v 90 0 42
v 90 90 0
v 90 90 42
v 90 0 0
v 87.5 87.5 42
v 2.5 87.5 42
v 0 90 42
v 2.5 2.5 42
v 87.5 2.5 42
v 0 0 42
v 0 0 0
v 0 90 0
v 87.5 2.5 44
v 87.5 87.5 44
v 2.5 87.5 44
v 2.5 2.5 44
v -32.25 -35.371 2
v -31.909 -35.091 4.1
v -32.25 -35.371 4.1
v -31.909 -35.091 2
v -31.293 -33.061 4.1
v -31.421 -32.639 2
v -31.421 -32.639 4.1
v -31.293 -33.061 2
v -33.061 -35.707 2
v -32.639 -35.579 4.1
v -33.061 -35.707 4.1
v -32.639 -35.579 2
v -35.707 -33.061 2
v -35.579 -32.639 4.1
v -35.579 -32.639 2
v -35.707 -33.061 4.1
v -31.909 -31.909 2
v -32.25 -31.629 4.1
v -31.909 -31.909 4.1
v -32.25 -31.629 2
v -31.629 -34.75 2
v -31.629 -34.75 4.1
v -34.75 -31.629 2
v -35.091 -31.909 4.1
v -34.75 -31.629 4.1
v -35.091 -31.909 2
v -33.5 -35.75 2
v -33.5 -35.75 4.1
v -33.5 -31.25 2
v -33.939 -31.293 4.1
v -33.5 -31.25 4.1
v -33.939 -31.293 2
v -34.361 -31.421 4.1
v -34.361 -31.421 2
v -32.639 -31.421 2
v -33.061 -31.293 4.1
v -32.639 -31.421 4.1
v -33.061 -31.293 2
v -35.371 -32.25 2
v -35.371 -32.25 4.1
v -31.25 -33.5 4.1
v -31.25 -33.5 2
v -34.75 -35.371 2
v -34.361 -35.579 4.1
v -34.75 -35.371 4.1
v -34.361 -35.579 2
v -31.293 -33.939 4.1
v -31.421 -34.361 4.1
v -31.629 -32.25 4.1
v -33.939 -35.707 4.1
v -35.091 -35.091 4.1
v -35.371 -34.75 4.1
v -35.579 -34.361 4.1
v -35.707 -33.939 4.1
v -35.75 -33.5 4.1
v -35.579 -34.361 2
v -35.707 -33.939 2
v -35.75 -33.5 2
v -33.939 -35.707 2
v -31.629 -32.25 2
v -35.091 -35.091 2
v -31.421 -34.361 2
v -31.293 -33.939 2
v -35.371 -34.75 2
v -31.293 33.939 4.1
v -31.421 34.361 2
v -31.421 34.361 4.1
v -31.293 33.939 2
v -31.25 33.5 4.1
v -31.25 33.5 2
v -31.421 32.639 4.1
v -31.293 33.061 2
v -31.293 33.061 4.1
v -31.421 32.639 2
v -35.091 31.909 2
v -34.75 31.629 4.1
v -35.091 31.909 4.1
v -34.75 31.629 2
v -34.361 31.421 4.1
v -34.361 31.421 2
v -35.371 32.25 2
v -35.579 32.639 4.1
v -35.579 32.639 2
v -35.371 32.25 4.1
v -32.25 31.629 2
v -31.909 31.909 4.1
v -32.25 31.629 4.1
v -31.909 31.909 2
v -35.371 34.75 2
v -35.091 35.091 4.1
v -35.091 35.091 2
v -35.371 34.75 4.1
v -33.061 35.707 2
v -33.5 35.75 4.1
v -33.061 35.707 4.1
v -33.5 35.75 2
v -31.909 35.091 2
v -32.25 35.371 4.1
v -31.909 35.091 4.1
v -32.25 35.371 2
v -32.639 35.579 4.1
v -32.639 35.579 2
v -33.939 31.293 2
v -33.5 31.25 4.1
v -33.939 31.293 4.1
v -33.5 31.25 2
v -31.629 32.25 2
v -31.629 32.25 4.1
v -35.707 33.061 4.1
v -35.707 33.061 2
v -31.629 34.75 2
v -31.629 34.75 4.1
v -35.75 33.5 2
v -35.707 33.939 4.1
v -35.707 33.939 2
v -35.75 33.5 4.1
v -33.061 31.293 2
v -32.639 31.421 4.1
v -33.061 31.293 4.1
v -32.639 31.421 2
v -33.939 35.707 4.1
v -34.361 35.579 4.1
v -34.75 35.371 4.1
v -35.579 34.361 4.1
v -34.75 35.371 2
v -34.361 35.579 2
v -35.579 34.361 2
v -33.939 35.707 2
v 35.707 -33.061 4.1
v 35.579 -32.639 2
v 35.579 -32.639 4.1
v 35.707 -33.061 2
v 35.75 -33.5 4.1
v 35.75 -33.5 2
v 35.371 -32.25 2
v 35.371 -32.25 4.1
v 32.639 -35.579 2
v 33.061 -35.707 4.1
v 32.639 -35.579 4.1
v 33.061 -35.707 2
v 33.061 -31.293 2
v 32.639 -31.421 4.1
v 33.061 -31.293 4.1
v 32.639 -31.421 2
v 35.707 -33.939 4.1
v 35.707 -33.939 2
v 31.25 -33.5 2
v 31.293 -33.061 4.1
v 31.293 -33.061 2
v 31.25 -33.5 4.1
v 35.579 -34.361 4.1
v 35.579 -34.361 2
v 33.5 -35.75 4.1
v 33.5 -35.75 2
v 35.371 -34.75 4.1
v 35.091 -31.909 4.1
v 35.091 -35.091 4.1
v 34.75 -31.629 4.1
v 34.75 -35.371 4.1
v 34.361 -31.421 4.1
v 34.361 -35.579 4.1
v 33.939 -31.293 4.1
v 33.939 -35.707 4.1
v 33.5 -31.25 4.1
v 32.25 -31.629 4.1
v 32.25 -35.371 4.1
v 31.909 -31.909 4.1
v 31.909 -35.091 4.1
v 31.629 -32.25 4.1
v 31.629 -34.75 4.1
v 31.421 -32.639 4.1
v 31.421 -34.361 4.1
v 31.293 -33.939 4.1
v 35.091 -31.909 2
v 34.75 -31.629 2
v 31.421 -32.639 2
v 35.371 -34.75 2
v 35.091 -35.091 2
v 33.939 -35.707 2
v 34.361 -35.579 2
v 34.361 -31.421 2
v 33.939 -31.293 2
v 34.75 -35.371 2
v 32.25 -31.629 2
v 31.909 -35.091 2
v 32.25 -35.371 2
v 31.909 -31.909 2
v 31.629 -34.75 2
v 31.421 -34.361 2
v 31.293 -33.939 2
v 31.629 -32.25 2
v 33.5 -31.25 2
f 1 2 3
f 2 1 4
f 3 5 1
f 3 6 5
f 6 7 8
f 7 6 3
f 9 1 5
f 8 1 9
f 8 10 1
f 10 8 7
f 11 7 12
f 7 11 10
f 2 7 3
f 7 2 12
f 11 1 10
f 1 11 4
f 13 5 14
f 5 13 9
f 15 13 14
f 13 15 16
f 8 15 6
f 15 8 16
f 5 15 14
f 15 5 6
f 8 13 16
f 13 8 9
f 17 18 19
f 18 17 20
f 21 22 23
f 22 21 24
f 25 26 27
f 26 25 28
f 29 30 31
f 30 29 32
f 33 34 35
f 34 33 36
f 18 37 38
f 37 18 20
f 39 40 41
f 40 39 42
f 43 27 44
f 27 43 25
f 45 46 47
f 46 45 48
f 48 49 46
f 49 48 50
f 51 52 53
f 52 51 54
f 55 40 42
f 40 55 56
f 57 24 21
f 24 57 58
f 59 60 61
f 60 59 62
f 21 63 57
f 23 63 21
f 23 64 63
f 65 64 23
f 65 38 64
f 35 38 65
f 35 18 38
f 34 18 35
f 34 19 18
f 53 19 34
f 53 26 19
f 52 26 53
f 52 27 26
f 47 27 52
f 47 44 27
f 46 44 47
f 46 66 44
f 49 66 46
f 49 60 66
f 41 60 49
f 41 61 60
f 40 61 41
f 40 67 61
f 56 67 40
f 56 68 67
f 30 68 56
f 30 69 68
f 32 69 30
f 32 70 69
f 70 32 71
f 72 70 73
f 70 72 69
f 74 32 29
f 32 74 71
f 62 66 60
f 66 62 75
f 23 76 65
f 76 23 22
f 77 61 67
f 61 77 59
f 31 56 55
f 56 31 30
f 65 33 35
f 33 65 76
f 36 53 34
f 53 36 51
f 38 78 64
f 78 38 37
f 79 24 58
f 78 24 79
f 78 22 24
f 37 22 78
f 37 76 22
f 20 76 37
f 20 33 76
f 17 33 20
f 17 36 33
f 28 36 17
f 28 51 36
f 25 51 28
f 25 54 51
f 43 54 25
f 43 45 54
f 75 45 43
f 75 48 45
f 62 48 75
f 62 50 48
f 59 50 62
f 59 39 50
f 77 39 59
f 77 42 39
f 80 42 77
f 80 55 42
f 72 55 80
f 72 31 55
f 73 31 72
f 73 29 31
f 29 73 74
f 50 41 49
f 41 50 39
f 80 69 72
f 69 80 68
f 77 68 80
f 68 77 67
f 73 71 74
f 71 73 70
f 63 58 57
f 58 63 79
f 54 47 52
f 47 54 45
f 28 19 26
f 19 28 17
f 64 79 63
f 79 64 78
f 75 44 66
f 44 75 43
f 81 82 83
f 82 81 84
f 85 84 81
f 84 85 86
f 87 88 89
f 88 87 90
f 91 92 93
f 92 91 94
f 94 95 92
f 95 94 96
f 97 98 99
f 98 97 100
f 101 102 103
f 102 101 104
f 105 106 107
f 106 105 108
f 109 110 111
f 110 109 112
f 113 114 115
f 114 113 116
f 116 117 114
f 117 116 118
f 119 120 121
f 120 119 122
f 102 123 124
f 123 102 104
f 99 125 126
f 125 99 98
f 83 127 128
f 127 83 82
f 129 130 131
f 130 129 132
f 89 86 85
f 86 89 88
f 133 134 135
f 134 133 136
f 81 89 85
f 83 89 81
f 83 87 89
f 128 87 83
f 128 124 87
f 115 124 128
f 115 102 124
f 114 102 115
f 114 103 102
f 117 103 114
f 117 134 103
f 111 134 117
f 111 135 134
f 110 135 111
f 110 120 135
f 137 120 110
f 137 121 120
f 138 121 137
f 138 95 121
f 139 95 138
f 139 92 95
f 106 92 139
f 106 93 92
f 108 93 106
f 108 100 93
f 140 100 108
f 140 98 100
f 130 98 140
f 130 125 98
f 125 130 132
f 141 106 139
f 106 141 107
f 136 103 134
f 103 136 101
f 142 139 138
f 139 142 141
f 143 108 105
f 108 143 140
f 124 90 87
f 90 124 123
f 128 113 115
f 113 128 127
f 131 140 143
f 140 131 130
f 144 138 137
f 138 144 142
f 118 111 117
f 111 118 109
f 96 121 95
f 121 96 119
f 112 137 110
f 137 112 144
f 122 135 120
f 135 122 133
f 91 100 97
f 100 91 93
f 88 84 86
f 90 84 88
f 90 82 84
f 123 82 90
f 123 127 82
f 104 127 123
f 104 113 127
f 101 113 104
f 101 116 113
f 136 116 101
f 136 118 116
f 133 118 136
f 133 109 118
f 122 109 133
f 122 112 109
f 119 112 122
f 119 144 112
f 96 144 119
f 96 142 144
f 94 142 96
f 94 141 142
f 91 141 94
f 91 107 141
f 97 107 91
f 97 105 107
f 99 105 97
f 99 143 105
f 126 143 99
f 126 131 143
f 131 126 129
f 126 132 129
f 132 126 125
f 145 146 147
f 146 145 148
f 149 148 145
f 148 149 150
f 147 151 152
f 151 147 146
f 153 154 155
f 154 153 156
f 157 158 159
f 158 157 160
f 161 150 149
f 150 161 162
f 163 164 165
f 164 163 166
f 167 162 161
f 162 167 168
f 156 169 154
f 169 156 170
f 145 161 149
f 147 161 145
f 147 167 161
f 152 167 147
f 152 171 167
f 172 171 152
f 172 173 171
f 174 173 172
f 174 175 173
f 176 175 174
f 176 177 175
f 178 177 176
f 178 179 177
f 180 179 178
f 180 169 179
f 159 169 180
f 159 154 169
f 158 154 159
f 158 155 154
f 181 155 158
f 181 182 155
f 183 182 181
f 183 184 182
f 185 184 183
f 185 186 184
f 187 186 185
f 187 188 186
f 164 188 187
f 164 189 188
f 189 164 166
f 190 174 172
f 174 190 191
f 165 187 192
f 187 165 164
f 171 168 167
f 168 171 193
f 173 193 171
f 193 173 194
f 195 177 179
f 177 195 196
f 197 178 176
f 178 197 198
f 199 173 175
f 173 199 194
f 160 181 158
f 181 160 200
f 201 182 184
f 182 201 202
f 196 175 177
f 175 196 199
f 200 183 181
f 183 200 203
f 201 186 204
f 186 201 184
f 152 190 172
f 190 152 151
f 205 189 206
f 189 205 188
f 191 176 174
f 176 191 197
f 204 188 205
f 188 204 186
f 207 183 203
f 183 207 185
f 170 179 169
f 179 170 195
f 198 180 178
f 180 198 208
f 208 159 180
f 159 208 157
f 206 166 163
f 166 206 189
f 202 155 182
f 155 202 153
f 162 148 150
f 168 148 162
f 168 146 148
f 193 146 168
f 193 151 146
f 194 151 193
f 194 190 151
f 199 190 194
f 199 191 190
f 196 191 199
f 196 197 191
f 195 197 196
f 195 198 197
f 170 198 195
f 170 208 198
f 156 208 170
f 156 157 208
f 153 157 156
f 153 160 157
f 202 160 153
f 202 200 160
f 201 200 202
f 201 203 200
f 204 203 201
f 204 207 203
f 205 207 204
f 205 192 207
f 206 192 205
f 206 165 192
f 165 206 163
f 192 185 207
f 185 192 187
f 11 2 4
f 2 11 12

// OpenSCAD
// DIY Magnetic Stirrer Housing for 80mm PC Fan
// Print Orientation: Upside down (Top plate on bed, walls rising up)
// Units: mm

// --- Dimensions ---
// Outer size of the box
W = 90;
H = 90;

// Thickness of the top plate (resting on bed)
T_top = 2;

// Height of the walls
H_wall = 40;

// Wall thickness
T_wall = 2.5;

// Fan mounting hole pattern
// Pattern is 71.5mm square, centred on the plate
PATTERN_SIZE = 71.5;
HOLE_SIZE = 4.5; // M4 screw hole

// Cable notch dimensions
NOTCH_WIDTH = 12;
NOTCH_DEPTH = 8; // Reaches from z=32 to z=40 (40-8=32)
NOTCH_WALL = 0; // Index of the wall to cut (0:Front, 1:Right, 2:Back, 3:Left)

// --- Configuration ---
// Fan is 80mm. Outer box is 90mm.
// Wall thickness is 2.5mm.
// Inner width = 90 - 2*2.5 = 85mm.
// Fan (80mm) fits inside 85mm inner space with 2.5mm clearance on each side.
// This matches the user's description of covering the fan.

$fn = 128; // High resolution for smooth curves and accurate hole sizes

// --- Helper Functions ---

// Create the solid base (top plate)
module create_base() {
    translate([0, 0, 0]) {
        cube([W, H, T_top]);
    }
}

// Create the four walls rising from the base
// We construct the walls as a single block with internal cavities to save memory and ensure watertightness
// The walls are 2.5mm thick.
// The inner void starts at z = T_top.
module create_walls() {
    // Define the outer profile of the walls (including the base footprint)
    // The walls sit on top of the base, so their bottom is at z = T_top.
    // However, to make one solid object, we can extrude a profile that includes the base thickness.
    
    // Let's build the walls as a hollow box starting from z = T_top
    // Outer dimensions of the wall structure: W x H
    // Inner dimensions of the wall structure: (W - 2*T_wall) x (H - 2*T_wall)
    
    translate([0, 0, T_top]) {
        // Outer block of the walls
        cube([W, H, H_wall]);
        
        // Cut out the inner cavity
        translate([T_wall, T_wall, T_top]) {
            cube([W - 2*T_wall, H - 2*T_wall, H_wall]);
        }
        
        // Cut out the cable notch
        // Notch is in one wall. Let's assume Wall 0 (Front, facing +Y) for simplicity in modeling,
        // then we can rotate if needed, but the prompt says "In one wall". 
        // Let's place it on the wall at Y = H/2 - T_wall (Front face).
        // Notch width: 12mm. Centred along the wall.
        // Notch depth: 8mm from the open edge (z=40) down to z=32.
        
        // Position of the notch:
        // X: Centred on the wall width (W). Wall is from x=0 to x=W.
        // Y: At the front face of the wall. The wall face is at y = H - T_wall.
        // Z: From 32 to 40.
        
        translate([
            (W - NOTCH_WIDTH)/2, 
            H - T_wall, 
            32
        ]) {
            cube([NOTCH_WIDTH, T_wall, NOTCH_DEPTH]);
        }
    }
}

// Create the screw holes
// Pattern: 71.5mm square, centred on the plate.
// The plate is 90x90.
// The pattern is centred on the plate, so the holes are at:
// x = +/- (71.5/2 - 4.5/2) = +/- 33.5
// y = +/- (71.5/2 - 4.5/2) = +/- 33.5
// Wait, "71.5 mm square pattern centred on the plate".
// Usually this means the distance between hole centers is 71.5mm.
// Center of plate is (0,0).
// Hole centers: (33.5, 33.5), (33.5, -33.5), (-33.5, 33.5), (-33.5, -33.5).

module create_screw_holes() {
    translate([0, 0, T_top]) {
        // We need to cut holes through the top plate (z=0 to z=2)
        // And potentially through the walls if they align, but the prompt says "through the top plate".
        // The walls are 2.5mm thick. The holes are 4.5mm.
        // If we cut a cylinder of 4.5mm diameter through the top plate, it will stop at z=2.
        // The walls are attached to the top plate.
        // To ensure the screws go through the top plate and into the wall (or just through the top),
        // we cut the cylinder. Since the walls are 2.5mm thick and the hole is 4.5mm,
        // the hole will pass through the top plate and enter the wall cavity if the wall is thin enough?
        // No, the wall is 2.5mm thick. The hole is 4.5mm diameter.
        // The hole will pass through the top plate (2mm) and then hit the wall material?
        // Actually, the wall is 2.5mm thick. The hole is 4.5mm wide.
        // The hole will pass through the top plate and cut into the wall.
        // This is fine for M4 screws; they will go through the top plate and thread into the wall or the fan mount.
        
        // Let's just cut the cylinder. It will go through the top plate and into the wall.
        // To ensure clean cuts, we extend slightly past the bottom of the wall if needed, 
        // but the prompt says "through the top plate". 
        // Let's cut exactly through the top plate (z=0 to z=2) and maybe a tiny bit into the wall to ensure clearance.
        // Actually, standard practice: cut through the top plate. The wall is 2.5mm.
        // If we cut a cylinder of height 2mm, it stops at z=2.
        // The wall starts at z=2. The hole is 4.5mm. The wall is 2.5mm thick.
        // The hole will be 4.5mm wide. The wall is 2.5mm thick.
        // The hole will pass through the top plate and cut a 4.5mm hole in the 2.5mm wall.
        // This is acceptable.
        
        // Coordinates:
        // Pattern size 71.5mm. Half size = 35.75mm.
        // Hole radius = 2.25mm.
        // Offset = 35.75 - 2.25 = 33.5mm.
        
        offset = (PATTERN_SIZE / 2) - (HOLE_SIZE / 2);
        
        for (i = [-1, 1]) {
            for (j = [-1, 1]) {
                translate([
                    i * offset,
                    j * offset,
                    0
                ]) {
                    cylinder(
                        h = T_top + 0.1, // Extend slightly past top plate to ensure clean cut
                        r = HOLE_SIZE / 2,
                        $fn = 32
                    );
                }
            }
        }
    }
}

// --- Main Assembly ---
union() {
    create_base();
    create_walls();
    create_screw_holes();
}
